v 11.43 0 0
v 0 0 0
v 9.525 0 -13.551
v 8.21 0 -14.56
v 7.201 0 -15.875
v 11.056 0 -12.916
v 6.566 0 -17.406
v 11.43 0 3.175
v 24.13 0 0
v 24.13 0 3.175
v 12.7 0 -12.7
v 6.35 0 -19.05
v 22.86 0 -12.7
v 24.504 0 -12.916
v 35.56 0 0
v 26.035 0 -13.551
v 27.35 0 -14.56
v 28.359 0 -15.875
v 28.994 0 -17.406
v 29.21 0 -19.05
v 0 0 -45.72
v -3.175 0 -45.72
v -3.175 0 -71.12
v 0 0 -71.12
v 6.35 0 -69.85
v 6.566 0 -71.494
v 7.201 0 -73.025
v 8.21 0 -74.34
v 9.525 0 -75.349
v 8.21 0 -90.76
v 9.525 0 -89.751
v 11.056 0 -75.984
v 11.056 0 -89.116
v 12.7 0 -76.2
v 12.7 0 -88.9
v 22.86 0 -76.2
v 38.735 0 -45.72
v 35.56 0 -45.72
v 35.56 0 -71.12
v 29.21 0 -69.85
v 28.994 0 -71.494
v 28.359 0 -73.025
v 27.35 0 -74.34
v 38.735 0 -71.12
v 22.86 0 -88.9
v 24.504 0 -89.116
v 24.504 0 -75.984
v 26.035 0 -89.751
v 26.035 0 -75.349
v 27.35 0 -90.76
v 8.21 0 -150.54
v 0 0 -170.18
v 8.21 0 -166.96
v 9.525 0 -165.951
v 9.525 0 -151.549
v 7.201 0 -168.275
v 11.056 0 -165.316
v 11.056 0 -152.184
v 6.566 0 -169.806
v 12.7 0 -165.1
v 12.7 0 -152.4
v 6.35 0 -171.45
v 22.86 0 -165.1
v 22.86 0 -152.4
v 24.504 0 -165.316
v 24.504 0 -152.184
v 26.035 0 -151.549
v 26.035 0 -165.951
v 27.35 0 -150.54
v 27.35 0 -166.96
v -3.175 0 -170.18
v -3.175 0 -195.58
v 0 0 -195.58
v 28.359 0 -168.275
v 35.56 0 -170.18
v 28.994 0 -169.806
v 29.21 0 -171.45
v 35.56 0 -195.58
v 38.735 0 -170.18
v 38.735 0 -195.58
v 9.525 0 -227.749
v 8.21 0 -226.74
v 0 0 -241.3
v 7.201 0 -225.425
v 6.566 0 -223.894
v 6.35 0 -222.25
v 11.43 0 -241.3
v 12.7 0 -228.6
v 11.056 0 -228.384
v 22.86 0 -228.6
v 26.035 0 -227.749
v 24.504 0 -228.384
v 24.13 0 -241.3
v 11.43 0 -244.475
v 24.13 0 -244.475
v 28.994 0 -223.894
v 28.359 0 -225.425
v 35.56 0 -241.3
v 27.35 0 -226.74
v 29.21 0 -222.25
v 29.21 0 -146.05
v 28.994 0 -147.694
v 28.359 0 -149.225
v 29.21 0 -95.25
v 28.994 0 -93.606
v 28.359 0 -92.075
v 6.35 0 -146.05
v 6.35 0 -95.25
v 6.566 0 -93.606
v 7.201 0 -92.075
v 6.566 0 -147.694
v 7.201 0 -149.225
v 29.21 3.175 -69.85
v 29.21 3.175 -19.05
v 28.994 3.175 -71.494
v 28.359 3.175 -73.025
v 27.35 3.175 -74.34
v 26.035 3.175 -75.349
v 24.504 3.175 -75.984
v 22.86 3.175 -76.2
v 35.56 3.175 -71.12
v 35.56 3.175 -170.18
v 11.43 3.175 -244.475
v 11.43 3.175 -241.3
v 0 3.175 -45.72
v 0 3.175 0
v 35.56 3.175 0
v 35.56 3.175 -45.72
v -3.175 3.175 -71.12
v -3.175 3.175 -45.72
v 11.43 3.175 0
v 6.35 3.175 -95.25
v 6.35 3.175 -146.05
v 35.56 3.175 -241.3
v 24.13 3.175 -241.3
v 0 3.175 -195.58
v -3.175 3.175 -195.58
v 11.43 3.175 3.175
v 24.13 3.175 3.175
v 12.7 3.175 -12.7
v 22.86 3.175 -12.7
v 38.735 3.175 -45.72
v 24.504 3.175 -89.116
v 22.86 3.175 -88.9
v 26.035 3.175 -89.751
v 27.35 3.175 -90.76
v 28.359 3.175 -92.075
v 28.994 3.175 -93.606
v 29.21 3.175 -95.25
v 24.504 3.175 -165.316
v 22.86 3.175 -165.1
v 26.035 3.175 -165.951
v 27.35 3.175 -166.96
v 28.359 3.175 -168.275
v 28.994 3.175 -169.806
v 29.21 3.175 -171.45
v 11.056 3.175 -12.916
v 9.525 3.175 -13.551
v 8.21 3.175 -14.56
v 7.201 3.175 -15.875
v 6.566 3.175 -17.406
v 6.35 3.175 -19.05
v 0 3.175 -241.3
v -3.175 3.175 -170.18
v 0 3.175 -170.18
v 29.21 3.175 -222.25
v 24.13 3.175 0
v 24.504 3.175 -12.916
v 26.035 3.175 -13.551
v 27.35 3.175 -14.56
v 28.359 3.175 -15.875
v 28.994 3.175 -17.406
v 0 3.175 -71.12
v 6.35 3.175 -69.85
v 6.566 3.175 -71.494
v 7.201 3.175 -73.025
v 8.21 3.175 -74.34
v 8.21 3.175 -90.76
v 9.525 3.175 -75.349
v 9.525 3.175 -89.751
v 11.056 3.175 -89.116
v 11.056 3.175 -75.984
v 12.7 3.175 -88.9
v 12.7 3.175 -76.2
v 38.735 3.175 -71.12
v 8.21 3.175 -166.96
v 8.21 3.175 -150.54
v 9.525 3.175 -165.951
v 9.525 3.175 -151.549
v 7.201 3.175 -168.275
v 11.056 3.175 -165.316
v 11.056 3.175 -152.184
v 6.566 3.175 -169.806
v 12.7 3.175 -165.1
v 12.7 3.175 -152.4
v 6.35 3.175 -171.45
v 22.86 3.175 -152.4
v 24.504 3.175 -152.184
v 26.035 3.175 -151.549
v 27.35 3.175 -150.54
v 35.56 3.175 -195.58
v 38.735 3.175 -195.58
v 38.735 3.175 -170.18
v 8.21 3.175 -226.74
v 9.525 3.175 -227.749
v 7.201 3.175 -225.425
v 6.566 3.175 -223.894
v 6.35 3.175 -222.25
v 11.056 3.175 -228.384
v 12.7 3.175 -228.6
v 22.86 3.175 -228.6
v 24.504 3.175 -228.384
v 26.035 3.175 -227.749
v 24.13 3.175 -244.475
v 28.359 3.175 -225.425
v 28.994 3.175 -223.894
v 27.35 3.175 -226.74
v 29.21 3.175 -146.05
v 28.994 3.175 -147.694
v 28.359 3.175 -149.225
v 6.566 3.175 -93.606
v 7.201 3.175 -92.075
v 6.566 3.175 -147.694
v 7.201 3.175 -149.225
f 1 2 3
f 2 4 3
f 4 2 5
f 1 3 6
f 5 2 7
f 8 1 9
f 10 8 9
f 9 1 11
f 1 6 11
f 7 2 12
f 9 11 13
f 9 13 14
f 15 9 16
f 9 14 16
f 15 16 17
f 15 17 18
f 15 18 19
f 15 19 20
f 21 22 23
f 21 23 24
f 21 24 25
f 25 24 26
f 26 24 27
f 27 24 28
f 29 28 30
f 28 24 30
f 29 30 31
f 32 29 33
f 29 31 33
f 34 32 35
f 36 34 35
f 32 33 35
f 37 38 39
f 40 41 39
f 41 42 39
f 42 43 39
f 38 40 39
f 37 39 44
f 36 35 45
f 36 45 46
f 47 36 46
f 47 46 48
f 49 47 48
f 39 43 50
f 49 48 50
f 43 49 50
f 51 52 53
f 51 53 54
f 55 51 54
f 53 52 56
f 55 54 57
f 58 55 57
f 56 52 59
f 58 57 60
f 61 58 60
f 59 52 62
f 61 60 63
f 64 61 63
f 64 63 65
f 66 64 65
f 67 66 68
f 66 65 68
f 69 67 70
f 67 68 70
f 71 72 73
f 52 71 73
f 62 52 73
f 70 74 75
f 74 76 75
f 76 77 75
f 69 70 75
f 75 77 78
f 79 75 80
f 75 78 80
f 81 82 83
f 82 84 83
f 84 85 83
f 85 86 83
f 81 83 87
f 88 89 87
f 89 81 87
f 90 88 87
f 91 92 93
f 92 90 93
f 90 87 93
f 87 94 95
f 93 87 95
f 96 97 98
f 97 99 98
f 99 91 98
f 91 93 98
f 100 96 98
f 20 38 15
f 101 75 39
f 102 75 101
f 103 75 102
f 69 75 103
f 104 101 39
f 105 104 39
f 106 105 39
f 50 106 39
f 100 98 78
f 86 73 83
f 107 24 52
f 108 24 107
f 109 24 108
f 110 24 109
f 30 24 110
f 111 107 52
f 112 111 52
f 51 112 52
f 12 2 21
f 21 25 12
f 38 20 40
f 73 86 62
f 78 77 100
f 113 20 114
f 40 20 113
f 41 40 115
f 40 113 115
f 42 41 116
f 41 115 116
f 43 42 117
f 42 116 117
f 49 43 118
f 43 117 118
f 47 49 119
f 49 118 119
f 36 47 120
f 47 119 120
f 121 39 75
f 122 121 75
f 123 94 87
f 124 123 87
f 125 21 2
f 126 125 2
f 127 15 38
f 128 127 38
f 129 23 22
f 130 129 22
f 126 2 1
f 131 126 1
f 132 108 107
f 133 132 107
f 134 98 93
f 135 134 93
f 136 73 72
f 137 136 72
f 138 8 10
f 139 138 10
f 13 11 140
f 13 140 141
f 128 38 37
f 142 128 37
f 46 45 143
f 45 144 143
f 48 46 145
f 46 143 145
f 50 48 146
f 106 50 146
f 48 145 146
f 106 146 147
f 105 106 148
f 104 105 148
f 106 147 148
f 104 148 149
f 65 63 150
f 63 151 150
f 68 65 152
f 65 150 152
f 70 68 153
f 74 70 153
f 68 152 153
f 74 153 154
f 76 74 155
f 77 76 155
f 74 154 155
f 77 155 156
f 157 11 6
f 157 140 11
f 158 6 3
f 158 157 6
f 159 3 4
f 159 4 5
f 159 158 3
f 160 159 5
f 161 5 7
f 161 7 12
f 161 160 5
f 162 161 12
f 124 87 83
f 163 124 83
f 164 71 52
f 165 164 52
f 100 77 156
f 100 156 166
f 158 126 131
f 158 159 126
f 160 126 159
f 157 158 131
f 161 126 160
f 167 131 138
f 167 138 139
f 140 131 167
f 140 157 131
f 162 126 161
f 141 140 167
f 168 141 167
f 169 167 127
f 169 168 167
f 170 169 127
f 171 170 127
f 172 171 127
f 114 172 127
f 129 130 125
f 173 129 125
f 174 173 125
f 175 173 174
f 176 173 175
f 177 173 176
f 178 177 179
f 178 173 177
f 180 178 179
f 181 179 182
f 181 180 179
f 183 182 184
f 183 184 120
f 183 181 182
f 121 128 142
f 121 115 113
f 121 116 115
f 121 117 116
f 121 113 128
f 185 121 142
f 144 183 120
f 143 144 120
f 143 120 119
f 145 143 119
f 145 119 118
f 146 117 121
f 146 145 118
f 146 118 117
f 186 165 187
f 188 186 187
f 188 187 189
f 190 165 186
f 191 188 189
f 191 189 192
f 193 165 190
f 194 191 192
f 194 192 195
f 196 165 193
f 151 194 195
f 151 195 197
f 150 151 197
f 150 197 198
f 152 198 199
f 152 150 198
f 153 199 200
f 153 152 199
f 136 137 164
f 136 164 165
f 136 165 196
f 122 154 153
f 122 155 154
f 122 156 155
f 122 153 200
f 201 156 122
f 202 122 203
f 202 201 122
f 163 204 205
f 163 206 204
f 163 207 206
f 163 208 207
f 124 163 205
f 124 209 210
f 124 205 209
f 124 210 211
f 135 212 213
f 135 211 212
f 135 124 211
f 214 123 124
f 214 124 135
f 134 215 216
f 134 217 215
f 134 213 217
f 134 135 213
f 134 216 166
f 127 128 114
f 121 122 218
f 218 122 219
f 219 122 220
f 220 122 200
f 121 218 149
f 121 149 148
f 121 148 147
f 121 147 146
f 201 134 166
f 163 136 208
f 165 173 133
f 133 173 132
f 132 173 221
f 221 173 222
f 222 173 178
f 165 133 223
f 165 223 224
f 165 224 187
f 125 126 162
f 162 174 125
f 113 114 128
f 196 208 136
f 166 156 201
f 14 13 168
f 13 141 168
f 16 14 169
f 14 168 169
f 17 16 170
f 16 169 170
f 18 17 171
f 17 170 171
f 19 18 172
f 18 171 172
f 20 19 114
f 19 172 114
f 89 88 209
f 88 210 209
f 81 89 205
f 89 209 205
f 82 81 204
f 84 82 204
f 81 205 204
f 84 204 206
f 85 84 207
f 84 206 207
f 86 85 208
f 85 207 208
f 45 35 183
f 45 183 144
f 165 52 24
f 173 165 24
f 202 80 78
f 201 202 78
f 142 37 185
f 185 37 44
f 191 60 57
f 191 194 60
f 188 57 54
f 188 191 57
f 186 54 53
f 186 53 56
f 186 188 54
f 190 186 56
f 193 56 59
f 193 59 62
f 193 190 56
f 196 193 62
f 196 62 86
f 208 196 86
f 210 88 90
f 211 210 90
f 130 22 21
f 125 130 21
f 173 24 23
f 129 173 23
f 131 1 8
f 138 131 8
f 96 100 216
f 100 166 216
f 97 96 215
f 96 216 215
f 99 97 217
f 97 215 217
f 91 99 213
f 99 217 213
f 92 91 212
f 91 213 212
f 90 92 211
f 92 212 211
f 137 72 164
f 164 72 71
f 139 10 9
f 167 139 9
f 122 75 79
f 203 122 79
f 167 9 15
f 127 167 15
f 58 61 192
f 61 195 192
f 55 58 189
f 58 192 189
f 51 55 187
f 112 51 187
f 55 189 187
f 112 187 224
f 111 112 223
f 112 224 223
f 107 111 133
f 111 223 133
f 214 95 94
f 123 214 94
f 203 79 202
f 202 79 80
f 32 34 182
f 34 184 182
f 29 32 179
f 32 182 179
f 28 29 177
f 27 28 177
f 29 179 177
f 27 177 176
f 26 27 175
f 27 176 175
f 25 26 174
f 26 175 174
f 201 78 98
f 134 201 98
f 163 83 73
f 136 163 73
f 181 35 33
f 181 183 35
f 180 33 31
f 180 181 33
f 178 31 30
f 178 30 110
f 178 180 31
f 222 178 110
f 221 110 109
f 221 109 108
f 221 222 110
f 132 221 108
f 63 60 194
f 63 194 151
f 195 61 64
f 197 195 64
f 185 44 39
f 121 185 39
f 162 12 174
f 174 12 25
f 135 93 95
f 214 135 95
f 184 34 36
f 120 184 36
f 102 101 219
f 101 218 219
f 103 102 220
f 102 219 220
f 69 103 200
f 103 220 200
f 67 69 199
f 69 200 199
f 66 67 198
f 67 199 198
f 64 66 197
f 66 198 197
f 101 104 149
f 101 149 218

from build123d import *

# Parameters (mm, degrees)
BOSS_EXTRUDE1_DEPTH = 3.175
SKETCH3_W           = 22.86
SKETCH3_H           = 63.5
CUT_EXTRUDE2_DEPTH  = 3.175
FILLET3_R           = 6.35


with BuildPart() as part:
    # Sketch2 → Boss-Extrude1 (new body)
    with BuildSketch(Plane(origin=(0, 0, 0), x_dir=(1, 0, 0), z_dir=(0, 1, 0))):
        Polygon((35.56, 0), (35.56, 45.72), (38.735, 45.72), (38.735, 71.12), (35.56, 71.12), (35.56, 170.18), (38.735, 170.18), (38.735, 195.58), (35.56, 195.58), (35.56, 241.3), (24.13, 241.3), (24.13, 244.475), (11.43, 244.475), (11.43, 241.3), (0, 241.3), (0, 195.58), (-3.175, 195.58), (-3.175, 170.18), (0, 170.18), (0, 71.12), (-3.175, 71.12), (-3.175, 45.72), (0, 45.72), (0, 0), (11.43, 0), (11.43, -3.175), (24.13, -3.175), (24.13, 0), align=None)
    extrude(amount=BOSS_EXTRUDE1_DEPTH)

    # Sketch3 → Cut-Extrude2 (cut)
    with BuildSketch(Plane(origin=(0, 0, 0), x_dir=(1, 0, 0), z_dir=(0, 1, 0))):
        with Locations((17.78, 44.45)):
            Rectangle(SKETCH3_W, SKETCH3_H)
        with Locations((17.78, 120.65)):
            Rectangle(SKETCH3_W, SKETCH3_H)
        with Locations((17.78, 196.85)):
            Rectangle(SKETCH3_W, SKETCH3_H)
    extrude(amount=CUT_EXTRUDE2_DEPTH, mode=Mode.SUBTRACT)

    # Fillet3
    fillet3_edges = [part.edges().sort_by_distance(p)[0] for p in [
        (29.21, 1.5875, -88.9),
        (29.21, 1.5875, -152.4),
        (6.35, 1.5875, -152.4),
        (6.35, 1.5875, -88.9),
        (6.35, 1.5875, -165.1),
        (29.21, 1.5875, -165.1),
        (29.21, 1.5875, -228.6),
        (6.35, 1.5875, -228.6),
        (29.21, 1.5875, -76.2),
        (6.35, 1.5875, -76.2),
        (6.35, 1.5875, -12.7),
        (29.21, 1.5875, -12.7),
    ]]
    fillet(fillet3_edges, radius=FILLET3_R)


solid = part.part
